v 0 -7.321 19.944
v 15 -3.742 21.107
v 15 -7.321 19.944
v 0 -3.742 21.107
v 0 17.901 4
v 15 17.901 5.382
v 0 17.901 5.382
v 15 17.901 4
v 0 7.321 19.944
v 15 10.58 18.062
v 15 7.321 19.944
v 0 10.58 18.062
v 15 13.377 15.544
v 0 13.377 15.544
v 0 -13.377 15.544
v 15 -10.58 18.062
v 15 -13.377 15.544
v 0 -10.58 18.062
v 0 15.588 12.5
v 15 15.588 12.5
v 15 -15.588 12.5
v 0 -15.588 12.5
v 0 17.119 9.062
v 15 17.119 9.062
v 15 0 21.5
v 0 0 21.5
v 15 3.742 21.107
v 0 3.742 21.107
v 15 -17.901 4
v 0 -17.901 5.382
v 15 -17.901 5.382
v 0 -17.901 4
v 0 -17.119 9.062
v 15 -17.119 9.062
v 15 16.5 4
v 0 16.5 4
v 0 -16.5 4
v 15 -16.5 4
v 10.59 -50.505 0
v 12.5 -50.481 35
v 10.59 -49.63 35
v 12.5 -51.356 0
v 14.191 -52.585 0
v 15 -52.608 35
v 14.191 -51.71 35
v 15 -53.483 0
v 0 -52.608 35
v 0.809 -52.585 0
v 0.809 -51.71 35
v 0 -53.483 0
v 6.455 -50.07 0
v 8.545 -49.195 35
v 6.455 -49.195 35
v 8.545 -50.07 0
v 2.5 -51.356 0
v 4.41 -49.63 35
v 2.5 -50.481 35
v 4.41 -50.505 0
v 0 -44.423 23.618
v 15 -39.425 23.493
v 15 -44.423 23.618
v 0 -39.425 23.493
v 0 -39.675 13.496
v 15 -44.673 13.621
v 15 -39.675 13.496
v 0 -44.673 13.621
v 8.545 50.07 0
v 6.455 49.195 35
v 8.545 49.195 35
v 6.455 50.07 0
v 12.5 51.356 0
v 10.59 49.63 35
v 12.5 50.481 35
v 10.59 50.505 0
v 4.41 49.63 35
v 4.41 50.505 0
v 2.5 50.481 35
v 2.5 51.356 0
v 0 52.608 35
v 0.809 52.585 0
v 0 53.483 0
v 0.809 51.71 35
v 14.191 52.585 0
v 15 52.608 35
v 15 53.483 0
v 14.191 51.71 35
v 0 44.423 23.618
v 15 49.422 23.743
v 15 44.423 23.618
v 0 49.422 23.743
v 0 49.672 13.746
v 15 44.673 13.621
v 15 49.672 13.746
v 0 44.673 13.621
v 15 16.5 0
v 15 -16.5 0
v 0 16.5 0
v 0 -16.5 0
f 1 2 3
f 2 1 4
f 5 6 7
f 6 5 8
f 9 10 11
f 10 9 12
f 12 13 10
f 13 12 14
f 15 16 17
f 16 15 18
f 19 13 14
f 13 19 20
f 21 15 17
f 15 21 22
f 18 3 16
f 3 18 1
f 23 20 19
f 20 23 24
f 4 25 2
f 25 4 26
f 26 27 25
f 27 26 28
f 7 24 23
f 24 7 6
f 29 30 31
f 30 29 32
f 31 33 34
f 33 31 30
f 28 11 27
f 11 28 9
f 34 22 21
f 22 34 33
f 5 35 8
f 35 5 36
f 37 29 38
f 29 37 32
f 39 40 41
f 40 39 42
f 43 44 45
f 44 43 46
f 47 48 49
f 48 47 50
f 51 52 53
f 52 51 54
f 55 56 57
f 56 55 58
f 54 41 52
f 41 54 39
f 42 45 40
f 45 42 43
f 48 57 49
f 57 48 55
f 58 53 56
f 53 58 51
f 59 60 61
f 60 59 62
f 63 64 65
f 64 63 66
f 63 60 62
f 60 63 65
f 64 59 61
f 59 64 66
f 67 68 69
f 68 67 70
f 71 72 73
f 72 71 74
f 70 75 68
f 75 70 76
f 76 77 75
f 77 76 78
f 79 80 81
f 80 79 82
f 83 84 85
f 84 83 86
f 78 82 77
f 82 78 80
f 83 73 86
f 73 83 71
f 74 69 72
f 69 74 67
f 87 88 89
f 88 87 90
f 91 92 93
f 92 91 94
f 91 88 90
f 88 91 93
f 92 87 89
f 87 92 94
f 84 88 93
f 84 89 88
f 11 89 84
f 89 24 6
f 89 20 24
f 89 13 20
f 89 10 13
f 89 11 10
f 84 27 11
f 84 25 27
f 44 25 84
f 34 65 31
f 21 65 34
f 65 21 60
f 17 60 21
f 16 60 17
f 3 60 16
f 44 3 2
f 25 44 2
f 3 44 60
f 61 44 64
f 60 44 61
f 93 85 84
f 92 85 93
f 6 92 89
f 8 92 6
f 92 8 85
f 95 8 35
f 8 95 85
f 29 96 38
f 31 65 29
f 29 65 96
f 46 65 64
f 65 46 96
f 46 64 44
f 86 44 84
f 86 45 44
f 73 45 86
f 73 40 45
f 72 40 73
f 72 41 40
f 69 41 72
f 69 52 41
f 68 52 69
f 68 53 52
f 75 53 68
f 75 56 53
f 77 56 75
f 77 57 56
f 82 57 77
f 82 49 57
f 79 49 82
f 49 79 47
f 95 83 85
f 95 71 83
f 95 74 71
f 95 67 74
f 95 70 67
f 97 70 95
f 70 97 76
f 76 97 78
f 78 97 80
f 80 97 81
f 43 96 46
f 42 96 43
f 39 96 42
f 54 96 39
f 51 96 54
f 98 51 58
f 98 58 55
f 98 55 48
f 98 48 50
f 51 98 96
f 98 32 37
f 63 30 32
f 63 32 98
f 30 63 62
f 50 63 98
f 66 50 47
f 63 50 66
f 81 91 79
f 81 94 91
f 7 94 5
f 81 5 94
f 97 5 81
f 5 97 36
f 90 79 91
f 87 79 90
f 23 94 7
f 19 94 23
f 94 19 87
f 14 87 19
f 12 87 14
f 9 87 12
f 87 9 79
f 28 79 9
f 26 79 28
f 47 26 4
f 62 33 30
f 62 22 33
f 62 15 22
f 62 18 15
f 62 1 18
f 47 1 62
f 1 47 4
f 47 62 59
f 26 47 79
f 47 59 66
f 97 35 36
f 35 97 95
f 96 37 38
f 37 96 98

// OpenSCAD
/* TODO

spacing
rackdia (plus thickness of inner tube for grip)
circlip width
racktaper


*/

module mudguard(spacing=100, thickness=15, rackdia=10) {
	clipwidth = 1.5; // Width of the hooks that hold the mudguard in
	circlip = 10; // Width of the hose clip that holds to bracket to the rack

	racktaper = asin(10/400); // angle of the legs of the rack. TODO

	difference() {
		translate([0,-spacing/2 - rackdia, 0]) cube([thickness,spacing + 2*rackdia,35]);
		translate ([0,0,4]) intersection() {
			translate([-20,0,-0.5]) rotate([0,90,0]) cylinder(r=18, h=50);
			translate([-20,-50,0]) cube([100,100,100]);
		}
		
		
		translate([-20,-18+clipwidth,-1]) cube([50, 36 - 2*clipwidth, 6]);


		rotate([-racktaper,0,0]) {
		translate([thickness/2, -spacing/2 - rackdia,-10]) cylinder(r=rackdia, h=35+20);

		# translate([-1, -spacing/2 + 5, (35-circlip)/2])
			cube([thickness+2, 5, circlip]);
		}

		rotate([racktaper, 0, 0]) {
		translate([thickness/2, spacing/2 + rackdia,-10]) cylinder(r=rackdia, h=35+20);

		# translate([-1, spacing/2 - 5, (35-circlip)/2])
			cube([thickness+2, 5, circlip]);
		}

	}
}


//rotate([0,-90,0])
mudguard();
